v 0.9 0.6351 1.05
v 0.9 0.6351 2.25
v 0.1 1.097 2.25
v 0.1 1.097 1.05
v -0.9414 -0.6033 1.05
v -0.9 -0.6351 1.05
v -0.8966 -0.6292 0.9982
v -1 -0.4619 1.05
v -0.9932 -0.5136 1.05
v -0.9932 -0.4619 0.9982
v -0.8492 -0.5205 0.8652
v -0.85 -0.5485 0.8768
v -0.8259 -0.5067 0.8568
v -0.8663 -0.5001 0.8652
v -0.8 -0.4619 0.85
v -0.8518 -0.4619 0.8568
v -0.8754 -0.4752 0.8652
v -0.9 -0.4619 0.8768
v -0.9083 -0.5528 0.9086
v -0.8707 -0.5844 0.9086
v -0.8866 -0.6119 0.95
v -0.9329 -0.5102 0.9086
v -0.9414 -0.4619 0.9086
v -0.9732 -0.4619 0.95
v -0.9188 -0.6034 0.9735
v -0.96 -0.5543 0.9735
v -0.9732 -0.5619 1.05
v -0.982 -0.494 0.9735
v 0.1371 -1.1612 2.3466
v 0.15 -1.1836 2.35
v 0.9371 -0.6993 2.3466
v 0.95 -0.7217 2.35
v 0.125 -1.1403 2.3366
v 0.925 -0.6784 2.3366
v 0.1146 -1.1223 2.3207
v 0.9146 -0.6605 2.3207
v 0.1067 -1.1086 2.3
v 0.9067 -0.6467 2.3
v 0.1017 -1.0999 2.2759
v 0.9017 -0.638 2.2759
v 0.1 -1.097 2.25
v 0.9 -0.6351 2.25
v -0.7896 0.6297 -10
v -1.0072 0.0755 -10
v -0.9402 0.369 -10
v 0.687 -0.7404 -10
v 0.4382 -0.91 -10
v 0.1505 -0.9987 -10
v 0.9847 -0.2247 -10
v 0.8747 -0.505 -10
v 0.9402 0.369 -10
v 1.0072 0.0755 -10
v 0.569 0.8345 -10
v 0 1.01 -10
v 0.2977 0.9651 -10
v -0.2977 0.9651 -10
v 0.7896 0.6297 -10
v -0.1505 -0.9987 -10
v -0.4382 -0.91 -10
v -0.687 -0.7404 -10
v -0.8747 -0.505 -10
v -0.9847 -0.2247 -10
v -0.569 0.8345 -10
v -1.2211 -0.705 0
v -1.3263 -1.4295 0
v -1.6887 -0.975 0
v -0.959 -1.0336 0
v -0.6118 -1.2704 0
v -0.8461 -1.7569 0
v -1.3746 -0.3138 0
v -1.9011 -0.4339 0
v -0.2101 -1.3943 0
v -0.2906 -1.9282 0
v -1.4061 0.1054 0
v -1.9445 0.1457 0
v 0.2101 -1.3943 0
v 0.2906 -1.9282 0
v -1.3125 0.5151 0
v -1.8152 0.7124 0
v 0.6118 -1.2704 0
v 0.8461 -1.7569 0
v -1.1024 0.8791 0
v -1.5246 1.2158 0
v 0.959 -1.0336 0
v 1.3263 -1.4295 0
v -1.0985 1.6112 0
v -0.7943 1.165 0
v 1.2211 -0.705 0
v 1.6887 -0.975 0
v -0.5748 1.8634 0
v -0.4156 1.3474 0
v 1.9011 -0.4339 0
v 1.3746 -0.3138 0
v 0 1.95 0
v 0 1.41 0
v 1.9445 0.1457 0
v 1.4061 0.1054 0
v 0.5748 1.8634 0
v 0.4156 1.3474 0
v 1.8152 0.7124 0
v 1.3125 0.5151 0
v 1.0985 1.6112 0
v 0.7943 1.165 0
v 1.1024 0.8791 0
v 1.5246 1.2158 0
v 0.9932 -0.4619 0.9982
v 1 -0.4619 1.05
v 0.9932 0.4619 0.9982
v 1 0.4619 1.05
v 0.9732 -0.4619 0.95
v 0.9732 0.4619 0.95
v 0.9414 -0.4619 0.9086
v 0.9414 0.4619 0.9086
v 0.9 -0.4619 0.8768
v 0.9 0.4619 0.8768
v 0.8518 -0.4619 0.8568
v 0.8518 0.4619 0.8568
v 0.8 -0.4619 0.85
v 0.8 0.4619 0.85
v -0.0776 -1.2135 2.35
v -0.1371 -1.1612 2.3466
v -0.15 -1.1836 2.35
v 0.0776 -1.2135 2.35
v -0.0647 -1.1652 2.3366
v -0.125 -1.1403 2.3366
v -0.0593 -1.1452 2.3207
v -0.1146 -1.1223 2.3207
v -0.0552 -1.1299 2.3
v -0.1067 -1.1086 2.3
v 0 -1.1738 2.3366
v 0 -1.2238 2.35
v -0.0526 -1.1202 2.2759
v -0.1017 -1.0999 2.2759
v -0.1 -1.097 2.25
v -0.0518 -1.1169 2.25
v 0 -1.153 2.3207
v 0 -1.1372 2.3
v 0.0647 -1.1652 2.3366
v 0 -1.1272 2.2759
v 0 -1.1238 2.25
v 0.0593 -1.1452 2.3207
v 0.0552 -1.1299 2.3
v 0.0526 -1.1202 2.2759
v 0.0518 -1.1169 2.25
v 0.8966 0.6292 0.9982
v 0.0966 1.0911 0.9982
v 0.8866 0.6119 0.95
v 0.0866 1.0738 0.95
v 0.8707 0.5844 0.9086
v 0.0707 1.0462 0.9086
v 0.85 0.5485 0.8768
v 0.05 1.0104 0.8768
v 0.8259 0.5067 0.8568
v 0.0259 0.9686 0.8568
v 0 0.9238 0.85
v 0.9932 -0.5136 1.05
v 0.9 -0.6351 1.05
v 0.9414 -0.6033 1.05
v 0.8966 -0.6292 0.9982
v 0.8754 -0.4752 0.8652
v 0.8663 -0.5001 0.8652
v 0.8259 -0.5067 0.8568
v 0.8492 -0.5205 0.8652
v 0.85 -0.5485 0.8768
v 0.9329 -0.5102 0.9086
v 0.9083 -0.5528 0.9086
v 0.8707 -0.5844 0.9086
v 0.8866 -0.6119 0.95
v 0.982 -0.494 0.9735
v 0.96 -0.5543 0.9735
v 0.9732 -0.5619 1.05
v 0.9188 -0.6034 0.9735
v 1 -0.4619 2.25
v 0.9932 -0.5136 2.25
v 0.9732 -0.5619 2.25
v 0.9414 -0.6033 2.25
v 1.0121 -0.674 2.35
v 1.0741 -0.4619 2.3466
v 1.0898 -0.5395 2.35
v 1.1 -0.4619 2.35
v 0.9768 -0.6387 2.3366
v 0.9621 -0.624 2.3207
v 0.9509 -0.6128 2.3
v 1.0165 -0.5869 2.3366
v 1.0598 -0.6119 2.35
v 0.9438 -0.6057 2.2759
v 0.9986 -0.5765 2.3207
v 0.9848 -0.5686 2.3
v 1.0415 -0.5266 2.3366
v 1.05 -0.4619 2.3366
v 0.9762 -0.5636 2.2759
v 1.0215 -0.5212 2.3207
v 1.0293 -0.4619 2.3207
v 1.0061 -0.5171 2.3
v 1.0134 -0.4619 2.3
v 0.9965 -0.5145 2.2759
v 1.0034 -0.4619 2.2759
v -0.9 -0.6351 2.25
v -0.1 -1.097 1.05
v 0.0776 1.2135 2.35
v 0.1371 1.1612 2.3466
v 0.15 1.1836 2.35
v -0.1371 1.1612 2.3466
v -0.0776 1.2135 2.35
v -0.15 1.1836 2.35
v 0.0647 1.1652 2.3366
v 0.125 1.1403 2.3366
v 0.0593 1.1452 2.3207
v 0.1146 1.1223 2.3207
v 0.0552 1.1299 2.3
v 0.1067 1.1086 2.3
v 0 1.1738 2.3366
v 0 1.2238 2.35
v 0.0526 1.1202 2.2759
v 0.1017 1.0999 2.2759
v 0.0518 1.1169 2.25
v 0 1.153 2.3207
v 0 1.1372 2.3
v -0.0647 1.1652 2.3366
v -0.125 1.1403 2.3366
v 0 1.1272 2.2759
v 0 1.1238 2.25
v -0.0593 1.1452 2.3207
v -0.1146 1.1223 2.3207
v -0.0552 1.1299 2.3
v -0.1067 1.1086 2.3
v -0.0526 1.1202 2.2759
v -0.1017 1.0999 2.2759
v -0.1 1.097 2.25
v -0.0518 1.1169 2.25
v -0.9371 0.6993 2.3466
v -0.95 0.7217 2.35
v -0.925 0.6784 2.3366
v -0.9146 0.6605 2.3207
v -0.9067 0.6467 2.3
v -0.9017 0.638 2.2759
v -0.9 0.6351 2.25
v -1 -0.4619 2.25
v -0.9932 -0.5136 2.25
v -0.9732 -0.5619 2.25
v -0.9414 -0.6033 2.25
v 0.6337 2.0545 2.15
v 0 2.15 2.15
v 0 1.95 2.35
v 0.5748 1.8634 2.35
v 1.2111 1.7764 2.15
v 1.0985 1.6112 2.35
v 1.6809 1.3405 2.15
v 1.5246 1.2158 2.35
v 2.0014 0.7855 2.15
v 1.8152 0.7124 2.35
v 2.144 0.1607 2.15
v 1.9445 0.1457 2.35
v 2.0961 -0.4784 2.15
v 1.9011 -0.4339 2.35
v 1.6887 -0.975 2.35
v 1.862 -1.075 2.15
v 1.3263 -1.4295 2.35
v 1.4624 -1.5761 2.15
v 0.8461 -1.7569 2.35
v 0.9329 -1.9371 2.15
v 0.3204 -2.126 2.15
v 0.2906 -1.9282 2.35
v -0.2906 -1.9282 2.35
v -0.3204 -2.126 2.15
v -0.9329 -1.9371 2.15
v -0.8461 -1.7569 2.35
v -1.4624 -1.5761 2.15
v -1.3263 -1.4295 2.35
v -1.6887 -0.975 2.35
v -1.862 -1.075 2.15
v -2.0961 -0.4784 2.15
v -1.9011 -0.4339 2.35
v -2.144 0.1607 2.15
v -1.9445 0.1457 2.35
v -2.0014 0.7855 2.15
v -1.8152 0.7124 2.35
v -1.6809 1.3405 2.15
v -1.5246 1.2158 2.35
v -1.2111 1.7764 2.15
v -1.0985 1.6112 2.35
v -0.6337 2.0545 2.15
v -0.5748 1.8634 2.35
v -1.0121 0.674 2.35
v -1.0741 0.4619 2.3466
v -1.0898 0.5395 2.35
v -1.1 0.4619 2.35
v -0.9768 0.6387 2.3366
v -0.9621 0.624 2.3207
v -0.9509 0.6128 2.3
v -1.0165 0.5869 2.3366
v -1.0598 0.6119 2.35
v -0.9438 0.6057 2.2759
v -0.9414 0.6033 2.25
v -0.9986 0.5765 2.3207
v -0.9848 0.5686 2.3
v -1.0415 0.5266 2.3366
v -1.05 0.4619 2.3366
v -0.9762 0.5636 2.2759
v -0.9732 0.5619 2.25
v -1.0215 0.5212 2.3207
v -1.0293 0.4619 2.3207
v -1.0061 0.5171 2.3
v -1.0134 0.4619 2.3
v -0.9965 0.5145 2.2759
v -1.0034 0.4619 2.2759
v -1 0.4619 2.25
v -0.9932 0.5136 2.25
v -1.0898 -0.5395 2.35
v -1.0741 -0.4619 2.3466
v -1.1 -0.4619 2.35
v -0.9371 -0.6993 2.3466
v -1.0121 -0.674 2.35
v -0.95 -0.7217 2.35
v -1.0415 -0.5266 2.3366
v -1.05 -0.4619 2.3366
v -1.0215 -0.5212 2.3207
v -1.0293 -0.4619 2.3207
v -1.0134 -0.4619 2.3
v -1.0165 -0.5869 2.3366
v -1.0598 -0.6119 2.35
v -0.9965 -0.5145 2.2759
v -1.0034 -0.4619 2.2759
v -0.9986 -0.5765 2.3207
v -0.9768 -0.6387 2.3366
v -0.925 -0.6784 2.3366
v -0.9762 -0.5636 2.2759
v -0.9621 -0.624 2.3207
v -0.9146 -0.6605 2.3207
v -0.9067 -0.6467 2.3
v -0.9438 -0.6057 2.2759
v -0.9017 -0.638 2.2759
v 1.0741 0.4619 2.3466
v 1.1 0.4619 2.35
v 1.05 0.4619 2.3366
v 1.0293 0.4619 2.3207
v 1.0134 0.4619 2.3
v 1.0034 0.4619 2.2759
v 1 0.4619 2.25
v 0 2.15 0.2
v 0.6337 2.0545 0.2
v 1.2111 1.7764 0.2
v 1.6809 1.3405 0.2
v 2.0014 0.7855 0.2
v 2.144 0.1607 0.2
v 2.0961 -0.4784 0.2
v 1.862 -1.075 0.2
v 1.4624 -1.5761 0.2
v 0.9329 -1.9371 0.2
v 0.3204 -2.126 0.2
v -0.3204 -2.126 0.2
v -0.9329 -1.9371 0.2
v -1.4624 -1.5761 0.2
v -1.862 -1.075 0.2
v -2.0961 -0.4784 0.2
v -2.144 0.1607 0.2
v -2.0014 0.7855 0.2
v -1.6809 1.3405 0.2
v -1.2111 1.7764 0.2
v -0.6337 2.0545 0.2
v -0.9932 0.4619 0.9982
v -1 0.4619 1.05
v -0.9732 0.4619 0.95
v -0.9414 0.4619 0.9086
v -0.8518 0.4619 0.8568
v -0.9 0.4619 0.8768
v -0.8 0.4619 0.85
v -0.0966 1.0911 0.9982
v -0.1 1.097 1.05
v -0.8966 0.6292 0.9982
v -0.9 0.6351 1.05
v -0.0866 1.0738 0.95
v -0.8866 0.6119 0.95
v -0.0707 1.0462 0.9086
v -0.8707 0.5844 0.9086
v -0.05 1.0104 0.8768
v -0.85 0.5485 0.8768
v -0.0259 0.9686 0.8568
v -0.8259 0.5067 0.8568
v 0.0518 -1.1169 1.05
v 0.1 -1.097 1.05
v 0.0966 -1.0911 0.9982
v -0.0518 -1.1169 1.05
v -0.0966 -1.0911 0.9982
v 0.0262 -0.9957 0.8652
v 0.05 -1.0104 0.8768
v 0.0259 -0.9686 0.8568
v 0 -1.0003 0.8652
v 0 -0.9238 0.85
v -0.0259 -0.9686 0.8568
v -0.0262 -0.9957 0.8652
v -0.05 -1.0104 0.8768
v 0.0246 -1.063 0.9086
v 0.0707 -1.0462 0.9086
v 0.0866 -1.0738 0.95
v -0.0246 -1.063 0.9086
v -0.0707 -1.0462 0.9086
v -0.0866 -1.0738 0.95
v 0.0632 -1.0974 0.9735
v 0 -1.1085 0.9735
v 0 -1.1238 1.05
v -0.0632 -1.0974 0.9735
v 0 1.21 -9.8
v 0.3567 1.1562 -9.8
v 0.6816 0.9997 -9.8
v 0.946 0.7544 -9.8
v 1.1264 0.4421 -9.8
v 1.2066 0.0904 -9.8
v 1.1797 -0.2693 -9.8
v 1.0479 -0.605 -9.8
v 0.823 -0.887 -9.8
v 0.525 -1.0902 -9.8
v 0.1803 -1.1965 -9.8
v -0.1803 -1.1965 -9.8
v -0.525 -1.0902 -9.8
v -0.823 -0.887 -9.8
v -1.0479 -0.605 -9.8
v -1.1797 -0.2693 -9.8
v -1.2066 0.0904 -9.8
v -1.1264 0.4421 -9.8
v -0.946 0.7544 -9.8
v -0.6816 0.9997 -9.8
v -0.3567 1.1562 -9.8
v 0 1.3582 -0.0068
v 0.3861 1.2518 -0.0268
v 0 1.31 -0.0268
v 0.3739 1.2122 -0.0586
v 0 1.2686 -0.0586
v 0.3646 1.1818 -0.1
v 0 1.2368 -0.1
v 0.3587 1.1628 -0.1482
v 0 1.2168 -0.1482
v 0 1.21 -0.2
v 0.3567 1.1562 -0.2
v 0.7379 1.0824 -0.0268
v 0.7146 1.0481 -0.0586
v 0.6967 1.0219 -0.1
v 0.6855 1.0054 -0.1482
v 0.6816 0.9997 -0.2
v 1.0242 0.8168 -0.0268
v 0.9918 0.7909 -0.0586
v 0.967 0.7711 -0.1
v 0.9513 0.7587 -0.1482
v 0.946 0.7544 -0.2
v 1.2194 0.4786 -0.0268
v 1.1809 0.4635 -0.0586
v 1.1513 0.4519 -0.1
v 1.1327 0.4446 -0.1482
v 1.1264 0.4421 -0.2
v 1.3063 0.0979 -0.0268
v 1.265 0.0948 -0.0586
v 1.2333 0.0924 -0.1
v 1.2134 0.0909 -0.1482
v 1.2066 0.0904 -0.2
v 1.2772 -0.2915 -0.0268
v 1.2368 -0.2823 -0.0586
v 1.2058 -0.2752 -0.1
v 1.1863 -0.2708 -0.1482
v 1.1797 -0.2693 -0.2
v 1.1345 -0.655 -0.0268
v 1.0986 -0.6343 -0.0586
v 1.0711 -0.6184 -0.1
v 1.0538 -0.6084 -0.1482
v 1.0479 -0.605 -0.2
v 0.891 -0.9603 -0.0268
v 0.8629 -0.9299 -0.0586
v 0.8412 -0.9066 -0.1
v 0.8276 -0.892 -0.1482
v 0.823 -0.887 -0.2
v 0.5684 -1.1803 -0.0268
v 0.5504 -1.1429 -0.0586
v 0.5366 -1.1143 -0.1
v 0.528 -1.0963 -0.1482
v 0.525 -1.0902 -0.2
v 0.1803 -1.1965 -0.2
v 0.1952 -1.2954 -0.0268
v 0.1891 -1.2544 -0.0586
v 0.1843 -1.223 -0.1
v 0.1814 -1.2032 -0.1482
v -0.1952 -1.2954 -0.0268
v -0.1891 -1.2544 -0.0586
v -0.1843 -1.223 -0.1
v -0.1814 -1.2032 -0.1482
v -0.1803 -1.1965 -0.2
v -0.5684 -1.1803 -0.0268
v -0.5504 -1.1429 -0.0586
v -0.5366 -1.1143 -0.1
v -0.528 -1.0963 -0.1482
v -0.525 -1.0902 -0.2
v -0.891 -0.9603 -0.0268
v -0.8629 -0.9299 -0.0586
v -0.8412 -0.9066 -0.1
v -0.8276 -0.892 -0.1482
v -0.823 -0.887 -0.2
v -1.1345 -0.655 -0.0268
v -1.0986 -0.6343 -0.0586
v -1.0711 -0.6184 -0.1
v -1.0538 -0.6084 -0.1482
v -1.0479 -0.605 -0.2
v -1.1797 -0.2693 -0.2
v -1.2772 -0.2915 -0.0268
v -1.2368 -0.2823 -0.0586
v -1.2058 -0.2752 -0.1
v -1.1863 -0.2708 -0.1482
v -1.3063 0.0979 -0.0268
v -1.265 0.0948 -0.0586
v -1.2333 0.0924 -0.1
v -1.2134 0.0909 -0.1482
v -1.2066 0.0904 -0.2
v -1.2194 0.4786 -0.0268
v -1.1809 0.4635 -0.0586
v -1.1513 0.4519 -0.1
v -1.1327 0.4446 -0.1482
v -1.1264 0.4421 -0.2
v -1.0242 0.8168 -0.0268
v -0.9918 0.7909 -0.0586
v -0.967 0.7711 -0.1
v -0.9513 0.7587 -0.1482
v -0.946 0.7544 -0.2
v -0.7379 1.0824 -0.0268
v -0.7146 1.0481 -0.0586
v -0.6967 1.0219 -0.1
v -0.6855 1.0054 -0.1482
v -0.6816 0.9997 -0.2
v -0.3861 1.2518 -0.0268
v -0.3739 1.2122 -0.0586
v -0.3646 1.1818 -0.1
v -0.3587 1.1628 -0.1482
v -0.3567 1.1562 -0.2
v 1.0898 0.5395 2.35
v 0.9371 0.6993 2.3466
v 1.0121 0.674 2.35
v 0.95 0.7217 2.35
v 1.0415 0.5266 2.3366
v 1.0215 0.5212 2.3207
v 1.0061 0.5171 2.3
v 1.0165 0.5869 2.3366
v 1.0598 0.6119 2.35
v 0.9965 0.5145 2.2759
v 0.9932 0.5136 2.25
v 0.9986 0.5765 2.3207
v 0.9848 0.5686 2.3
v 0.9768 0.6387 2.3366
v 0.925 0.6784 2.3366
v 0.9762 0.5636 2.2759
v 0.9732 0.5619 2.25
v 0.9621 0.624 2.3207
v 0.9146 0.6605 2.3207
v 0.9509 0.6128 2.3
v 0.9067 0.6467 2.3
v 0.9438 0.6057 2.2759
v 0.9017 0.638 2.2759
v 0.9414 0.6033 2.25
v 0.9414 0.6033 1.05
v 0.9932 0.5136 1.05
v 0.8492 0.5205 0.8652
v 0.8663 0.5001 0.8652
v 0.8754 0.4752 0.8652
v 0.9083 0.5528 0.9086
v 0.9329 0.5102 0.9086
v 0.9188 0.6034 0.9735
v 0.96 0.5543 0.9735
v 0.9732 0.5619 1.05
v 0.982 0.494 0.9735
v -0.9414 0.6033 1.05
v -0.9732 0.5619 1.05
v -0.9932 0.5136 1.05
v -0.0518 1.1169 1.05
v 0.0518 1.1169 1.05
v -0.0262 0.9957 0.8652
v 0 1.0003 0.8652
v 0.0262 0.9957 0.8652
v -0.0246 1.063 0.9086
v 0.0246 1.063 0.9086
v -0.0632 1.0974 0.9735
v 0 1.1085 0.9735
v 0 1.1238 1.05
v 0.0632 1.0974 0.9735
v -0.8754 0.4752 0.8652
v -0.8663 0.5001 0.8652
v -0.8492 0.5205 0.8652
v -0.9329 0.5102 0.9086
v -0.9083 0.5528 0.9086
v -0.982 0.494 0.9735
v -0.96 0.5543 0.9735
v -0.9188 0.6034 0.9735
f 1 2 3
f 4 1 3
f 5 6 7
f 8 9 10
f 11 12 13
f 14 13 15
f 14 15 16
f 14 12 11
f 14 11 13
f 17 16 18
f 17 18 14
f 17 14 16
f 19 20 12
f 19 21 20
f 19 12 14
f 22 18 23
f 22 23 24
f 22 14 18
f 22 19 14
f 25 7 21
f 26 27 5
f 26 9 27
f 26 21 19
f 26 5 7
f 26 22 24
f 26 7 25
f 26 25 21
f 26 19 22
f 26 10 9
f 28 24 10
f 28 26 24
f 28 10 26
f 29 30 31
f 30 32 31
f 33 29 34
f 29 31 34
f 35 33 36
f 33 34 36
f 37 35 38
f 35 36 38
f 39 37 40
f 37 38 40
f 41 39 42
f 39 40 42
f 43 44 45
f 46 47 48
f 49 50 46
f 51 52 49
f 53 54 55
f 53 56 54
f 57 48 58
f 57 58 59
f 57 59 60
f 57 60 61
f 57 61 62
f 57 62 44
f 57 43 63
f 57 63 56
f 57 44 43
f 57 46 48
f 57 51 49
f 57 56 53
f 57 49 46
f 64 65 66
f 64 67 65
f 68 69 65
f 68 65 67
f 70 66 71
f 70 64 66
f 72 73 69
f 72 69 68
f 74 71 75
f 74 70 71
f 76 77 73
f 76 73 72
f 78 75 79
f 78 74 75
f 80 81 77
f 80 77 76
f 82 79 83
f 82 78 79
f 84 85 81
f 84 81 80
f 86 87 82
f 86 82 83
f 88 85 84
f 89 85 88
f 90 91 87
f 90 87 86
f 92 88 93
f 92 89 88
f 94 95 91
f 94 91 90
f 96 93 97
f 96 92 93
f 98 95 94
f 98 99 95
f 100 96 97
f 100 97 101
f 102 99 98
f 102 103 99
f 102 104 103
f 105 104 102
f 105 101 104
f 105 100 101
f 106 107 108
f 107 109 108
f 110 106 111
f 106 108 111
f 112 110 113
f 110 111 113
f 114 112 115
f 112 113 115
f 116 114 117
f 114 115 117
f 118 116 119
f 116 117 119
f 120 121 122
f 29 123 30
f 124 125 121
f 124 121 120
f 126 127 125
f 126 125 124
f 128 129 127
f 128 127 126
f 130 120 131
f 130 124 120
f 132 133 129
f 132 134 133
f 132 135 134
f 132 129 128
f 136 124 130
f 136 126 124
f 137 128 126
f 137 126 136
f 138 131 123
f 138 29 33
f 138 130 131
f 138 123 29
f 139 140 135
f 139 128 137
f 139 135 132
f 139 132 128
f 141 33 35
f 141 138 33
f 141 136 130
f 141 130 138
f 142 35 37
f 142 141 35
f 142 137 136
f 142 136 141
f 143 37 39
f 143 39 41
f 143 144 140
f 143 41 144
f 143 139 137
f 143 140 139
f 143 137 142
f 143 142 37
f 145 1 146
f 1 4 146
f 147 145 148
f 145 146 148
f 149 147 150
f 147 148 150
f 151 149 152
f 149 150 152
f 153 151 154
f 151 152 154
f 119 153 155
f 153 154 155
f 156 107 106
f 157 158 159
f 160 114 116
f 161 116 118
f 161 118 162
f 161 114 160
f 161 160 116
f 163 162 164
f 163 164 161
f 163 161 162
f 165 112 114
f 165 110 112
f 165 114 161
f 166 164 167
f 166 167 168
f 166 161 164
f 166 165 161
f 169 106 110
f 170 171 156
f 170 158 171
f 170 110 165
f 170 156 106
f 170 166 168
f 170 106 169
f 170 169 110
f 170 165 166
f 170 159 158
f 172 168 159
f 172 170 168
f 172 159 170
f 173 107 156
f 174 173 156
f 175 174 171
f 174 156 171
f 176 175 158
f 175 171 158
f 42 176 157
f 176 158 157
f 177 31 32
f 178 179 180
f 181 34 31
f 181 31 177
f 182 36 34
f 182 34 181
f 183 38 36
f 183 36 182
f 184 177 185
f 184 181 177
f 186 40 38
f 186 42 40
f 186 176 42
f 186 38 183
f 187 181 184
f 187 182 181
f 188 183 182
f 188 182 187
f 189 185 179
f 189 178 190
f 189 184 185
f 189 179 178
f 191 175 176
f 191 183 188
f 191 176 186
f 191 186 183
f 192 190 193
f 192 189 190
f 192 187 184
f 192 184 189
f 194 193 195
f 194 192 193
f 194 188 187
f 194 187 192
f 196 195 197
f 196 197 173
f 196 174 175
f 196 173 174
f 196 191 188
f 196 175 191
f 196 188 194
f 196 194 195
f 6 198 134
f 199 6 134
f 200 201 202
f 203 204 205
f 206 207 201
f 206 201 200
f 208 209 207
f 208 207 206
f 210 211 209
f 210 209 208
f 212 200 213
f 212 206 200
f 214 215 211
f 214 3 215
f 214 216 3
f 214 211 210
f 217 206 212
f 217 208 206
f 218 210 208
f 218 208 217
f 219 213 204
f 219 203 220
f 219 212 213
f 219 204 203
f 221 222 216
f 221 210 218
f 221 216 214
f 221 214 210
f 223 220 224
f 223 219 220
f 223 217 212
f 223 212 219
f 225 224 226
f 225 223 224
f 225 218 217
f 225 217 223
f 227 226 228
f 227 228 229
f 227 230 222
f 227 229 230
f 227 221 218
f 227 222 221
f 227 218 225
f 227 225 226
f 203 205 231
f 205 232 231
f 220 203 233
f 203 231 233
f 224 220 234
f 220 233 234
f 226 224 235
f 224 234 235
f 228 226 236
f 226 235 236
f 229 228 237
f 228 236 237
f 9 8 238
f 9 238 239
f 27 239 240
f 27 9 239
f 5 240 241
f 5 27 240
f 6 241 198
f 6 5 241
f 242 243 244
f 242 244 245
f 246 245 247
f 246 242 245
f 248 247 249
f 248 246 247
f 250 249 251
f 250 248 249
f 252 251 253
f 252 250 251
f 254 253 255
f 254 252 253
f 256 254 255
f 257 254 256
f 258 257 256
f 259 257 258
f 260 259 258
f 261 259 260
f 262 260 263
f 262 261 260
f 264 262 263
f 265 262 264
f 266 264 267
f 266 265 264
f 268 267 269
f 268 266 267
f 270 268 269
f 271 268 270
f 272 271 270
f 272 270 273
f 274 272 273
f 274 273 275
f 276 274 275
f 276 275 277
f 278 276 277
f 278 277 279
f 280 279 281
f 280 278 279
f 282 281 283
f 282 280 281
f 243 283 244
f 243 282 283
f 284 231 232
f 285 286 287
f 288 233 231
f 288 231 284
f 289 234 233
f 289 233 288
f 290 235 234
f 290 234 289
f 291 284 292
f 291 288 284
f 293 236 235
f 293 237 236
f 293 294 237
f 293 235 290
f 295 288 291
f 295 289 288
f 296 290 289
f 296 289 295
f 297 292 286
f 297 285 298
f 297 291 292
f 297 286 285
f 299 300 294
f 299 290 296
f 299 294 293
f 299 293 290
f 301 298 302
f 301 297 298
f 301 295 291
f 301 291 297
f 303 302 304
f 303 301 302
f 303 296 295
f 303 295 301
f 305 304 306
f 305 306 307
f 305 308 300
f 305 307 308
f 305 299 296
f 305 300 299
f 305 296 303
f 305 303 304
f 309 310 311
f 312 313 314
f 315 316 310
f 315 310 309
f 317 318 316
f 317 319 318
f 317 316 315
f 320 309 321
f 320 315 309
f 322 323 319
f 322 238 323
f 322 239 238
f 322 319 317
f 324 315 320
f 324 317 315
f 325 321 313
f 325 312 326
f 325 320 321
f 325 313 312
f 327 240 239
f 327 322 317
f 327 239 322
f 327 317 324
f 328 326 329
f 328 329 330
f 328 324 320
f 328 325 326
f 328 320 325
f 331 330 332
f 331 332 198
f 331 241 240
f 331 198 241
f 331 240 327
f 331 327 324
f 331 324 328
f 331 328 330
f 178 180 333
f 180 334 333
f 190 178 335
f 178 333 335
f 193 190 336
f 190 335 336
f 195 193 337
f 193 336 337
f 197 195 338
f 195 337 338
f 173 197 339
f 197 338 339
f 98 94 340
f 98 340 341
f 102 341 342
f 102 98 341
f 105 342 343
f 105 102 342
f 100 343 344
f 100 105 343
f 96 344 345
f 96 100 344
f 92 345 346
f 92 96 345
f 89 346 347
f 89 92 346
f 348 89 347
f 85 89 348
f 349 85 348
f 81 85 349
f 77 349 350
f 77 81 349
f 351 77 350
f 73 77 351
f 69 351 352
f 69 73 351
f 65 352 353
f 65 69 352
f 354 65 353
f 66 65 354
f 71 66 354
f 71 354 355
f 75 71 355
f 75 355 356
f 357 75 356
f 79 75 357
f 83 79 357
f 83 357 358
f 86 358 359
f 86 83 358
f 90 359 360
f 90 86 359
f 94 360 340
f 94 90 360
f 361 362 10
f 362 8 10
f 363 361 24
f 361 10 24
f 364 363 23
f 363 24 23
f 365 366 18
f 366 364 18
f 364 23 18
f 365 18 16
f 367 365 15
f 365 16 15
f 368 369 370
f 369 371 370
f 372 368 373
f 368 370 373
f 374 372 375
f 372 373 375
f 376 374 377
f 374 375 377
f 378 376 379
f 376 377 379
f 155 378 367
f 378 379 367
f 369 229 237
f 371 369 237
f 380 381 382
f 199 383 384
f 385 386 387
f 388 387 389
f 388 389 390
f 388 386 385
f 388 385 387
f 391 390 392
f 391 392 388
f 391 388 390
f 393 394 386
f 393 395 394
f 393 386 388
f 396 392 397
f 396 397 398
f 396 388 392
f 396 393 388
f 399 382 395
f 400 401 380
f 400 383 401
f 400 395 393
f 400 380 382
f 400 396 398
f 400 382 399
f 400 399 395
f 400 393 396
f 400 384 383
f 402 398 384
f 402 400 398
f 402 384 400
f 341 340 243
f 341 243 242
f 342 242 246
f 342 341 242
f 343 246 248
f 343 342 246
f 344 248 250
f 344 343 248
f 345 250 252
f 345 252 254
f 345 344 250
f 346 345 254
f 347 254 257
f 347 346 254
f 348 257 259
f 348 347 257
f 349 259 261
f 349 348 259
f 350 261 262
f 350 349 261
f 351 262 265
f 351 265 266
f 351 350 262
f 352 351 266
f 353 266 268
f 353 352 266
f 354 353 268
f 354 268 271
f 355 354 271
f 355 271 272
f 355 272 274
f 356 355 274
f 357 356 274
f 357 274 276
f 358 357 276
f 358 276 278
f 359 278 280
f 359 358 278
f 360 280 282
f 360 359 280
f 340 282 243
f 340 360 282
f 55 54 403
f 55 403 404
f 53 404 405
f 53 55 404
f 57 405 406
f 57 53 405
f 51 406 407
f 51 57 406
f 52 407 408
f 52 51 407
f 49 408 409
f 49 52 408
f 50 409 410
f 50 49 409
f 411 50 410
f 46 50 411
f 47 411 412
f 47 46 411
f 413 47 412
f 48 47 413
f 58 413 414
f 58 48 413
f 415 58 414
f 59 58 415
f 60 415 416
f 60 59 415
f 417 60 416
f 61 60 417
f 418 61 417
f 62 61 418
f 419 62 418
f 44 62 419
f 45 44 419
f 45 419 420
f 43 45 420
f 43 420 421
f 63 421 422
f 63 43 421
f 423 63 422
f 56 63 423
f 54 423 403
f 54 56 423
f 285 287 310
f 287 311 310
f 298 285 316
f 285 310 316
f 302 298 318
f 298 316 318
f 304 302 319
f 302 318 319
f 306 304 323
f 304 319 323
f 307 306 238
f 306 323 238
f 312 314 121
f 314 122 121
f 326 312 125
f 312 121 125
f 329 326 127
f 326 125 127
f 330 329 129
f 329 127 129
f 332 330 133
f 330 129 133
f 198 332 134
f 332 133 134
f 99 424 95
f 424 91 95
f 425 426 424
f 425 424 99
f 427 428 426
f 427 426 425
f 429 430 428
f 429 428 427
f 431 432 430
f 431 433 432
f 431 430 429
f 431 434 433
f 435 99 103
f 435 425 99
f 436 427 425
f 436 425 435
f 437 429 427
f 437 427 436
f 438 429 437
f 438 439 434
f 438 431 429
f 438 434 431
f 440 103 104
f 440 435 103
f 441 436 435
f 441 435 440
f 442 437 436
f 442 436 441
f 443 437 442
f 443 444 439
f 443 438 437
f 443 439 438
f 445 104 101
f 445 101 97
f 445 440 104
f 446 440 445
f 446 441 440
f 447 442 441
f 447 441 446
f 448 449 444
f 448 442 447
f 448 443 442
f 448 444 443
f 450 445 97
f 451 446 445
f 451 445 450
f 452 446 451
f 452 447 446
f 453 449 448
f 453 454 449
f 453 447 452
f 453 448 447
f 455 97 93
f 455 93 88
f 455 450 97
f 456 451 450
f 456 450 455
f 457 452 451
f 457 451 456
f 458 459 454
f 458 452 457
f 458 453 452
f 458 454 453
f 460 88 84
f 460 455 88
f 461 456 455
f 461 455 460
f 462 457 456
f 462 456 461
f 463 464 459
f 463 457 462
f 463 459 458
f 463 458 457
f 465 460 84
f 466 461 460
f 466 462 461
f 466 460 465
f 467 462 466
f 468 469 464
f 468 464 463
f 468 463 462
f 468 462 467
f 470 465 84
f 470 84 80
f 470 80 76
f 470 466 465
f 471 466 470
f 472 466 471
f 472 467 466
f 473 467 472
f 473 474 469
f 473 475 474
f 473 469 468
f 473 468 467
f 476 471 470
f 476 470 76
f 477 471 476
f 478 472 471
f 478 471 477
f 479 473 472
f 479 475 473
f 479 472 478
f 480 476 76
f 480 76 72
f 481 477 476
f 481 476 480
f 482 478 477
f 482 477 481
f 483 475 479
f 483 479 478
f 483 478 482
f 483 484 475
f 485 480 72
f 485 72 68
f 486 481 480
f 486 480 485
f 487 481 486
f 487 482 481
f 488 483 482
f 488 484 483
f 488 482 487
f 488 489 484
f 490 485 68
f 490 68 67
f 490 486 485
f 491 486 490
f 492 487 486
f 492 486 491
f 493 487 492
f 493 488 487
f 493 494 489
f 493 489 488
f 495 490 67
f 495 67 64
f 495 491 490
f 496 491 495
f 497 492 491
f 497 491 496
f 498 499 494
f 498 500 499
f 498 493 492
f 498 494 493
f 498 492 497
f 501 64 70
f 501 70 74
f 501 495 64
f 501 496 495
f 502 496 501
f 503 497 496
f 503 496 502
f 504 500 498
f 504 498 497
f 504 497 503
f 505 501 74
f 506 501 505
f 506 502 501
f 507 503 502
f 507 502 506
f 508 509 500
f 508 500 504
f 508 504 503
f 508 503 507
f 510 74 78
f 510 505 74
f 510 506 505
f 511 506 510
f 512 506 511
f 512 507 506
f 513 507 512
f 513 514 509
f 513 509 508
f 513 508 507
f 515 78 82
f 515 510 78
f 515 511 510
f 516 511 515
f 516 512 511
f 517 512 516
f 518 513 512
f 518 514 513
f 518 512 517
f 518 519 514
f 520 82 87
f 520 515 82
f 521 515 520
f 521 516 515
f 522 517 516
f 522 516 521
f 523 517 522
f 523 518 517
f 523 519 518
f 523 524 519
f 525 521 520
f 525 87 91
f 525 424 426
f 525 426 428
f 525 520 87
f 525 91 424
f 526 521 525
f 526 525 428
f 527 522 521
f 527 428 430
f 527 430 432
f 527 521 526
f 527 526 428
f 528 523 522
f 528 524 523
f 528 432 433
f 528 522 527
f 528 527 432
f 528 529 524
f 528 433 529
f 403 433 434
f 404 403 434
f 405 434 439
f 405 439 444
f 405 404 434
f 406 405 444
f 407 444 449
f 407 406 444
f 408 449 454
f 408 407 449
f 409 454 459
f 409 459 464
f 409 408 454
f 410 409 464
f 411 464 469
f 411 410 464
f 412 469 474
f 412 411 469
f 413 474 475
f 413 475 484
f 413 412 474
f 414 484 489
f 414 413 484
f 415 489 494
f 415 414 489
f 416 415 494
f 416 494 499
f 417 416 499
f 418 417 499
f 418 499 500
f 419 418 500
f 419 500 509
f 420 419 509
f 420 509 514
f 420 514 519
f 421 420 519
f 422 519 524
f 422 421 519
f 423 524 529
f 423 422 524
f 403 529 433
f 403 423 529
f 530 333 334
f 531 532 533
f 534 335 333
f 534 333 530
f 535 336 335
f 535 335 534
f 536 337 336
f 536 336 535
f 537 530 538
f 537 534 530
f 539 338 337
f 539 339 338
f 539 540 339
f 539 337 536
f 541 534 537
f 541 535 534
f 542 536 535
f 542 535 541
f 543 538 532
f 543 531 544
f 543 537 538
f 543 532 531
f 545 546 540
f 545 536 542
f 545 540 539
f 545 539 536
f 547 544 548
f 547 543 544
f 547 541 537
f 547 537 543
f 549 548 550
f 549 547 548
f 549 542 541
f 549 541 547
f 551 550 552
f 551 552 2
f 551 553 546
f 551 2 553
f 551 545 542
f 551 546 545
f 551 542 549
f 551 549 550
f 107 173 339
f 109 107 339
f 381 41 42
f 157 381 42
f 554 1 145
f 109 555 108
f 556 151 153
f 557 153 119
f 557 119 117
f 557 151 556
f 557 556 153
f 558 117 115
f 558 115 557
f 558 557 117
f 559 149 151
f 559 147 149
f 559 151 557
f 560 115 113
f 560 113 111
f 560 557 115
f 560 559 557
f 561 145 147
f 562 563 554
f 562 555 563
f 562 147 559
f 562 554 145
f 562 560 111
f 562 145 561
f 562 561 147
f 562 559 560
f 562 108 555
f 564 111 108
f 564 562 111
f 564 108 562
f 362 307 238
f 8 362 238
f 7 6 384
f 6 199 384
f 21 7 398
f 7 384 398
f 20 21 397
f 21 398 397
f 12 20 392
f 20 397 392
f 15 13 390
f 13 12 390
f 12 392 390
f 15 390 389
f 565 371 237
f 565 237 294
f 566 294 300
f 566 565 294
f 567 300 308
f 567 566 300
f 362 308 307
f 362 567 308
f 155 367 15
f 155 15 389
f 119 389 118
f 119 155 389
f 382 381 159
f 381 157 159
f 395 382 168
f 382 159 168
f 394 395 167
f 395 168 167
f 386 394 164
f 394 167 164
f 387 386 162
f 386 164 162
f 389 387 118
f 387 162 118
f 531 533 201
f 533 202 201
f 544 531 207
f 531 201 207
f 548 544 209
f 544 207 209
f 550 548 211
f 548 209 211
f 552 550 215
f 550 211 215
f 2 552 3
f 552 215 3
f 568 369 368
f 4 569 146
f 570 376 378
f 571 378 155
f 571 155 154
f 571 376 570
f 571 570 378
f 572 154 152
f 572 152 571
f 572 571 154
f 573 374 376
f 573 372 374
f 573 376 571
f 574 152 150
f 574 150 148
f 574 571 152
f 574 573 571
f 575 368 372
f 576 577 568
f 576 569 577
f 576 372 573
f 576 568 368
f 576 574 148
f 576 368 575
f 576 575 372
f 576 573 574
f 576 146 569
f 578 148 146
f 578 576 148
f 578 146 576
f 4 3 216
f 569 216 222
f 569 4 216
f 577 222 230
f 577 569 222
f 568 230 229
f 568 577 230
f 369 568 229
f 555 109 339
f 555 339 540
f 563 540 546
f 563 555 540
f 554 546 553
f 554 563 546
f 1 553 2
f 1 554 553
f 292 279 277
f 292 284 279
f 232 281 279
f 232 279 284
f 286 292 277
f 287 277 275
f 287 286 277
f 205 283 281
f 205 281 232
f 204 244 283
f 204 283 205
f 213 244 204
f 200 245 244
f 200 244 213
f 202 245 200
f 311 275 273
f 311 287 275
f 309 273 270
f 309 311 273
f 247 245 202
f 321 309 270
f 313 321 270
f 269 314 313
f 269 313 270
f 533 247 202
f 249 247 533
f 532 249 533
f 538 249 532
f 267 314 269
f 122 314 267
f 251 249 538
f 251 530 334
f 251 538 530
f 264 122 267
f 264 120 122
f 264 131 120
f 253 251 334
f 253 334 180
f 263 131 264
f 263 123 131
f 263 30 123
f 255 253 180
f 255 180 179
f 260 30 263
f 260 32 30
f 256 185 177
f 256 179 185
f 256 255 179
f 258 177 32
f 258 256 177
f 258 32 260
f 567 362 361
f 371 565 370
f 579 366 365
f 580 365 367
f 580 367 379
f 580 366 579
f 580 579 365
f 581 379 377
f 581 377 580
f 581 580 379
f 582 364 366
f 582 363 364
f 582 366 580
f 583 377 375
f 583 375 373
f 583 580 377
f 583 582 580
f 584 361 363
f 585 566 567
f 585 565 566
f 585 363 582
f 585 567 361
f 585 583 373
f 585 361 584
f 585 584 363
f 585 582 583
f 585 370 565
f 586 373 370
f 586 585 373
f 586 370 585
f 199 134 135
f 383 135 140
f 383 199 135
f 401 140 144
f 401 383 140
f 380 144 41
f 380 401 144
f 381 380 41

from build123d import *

# Parameters (mm, degrees)
SCHNITT_LINEAR_AUSTRAGEN1_DEPTH = 1.5
FASE1_SIZE                      = 0.2
VERRUNDUNG1_R                   = 0.2
VERRUNDUNG2_R                   = 0.1


with BuildPart() as part:
    # Skizze1 → Rotation1 (revolve)
    with BuildSketch(Plane(origin=(0, 0, 0), x_dir=(0, 0, -1), z_dir=(1, 0, 0))):
        Polygon((-2.35, 0), (-2.35, 2.15), (0, 2.15), (0, 1.21), (10, 1.21), (10, 0), align=None)
    revolve(axis=Axis((0, 0, 21.919879518), (0, 0, -1)))

    # Skizze2 → Schnitt-Linear austragen1 (cut)
    with BuildSketch(Plane.XY.offset(2.35)):
        Polygon((1, -0.577350269), (1, 0.577350269), (0, 1.154700538), (-1, 0.577350269), (-1, -0.577350269), (0, -1.154700538), align=None)
    extrude(amount=-SCHNITT_LINEAR_AUSTRAGEN1_DEPTH, mode=Mode.SUBTRACT)

    # Fase1
    fase1_edges = [part.edges().sort_by_distance(p)[0] for p in [
        (0, -1.21, -10),
        (0, -2.15, 0),
        (0, -2.15, 2.35),
    ]]
    chamfer(fase1_edges, length=FASE1_SIZE)

    # Verrundung1
    verrundung1_edges = [part.edges().sort_by_distance(p)[0] for p in [
        (0.5, -0.866025404, 0.85),
        (1, -0.577350269, 1.6),
        (-0.5, -0.866025404, 0.85),
        (0, -1.154700538, 1.6),
        (-1, 0, 0.85),
        (-1, -0.577350269, 1.6),
        (-0.5, 0.866025404, 0.85),
        (-1, 0.577350269, 1.6),
        (0.5, 0.866025404, 0.85),
        (0, 1.154700538, 1.6),
        (1, 0, 0.85),
        (1, 0.577350269, 1.6),
        (0, -1.21, 0),
    ]]
    fillet(verrundung1_edges, radius=VERRUNDUNG1_R)

    # Verrundung2
    verrundung2_edges = [part.edges().sort_by_distance(p)[0] for p in [
        (-0.5, -0.866025404, 2.35),
        (-1, 0, 2.35),
        (-0.5, 0.866025404, 2.35),
        (0.5, 0.866025404, 2.35),
        (1, 0, 2.35),
        (0.5, -0.866025404, 2.35),
        (-0.973205081, -0.561880215, 2.35),
        (0, -1.123760431, 2.35),
        (0.973205081, -0.561880215, 2.35),
        (0.973205081, 0.561880215, 2.35),
        (0, 1.123760431, 2.35),
        (-0.973205081, 0.561880215, 2.35),
    ]]
    fillet(verrundung2_edges, radius=VERRUNDUNG2_R)


solid = part.part
